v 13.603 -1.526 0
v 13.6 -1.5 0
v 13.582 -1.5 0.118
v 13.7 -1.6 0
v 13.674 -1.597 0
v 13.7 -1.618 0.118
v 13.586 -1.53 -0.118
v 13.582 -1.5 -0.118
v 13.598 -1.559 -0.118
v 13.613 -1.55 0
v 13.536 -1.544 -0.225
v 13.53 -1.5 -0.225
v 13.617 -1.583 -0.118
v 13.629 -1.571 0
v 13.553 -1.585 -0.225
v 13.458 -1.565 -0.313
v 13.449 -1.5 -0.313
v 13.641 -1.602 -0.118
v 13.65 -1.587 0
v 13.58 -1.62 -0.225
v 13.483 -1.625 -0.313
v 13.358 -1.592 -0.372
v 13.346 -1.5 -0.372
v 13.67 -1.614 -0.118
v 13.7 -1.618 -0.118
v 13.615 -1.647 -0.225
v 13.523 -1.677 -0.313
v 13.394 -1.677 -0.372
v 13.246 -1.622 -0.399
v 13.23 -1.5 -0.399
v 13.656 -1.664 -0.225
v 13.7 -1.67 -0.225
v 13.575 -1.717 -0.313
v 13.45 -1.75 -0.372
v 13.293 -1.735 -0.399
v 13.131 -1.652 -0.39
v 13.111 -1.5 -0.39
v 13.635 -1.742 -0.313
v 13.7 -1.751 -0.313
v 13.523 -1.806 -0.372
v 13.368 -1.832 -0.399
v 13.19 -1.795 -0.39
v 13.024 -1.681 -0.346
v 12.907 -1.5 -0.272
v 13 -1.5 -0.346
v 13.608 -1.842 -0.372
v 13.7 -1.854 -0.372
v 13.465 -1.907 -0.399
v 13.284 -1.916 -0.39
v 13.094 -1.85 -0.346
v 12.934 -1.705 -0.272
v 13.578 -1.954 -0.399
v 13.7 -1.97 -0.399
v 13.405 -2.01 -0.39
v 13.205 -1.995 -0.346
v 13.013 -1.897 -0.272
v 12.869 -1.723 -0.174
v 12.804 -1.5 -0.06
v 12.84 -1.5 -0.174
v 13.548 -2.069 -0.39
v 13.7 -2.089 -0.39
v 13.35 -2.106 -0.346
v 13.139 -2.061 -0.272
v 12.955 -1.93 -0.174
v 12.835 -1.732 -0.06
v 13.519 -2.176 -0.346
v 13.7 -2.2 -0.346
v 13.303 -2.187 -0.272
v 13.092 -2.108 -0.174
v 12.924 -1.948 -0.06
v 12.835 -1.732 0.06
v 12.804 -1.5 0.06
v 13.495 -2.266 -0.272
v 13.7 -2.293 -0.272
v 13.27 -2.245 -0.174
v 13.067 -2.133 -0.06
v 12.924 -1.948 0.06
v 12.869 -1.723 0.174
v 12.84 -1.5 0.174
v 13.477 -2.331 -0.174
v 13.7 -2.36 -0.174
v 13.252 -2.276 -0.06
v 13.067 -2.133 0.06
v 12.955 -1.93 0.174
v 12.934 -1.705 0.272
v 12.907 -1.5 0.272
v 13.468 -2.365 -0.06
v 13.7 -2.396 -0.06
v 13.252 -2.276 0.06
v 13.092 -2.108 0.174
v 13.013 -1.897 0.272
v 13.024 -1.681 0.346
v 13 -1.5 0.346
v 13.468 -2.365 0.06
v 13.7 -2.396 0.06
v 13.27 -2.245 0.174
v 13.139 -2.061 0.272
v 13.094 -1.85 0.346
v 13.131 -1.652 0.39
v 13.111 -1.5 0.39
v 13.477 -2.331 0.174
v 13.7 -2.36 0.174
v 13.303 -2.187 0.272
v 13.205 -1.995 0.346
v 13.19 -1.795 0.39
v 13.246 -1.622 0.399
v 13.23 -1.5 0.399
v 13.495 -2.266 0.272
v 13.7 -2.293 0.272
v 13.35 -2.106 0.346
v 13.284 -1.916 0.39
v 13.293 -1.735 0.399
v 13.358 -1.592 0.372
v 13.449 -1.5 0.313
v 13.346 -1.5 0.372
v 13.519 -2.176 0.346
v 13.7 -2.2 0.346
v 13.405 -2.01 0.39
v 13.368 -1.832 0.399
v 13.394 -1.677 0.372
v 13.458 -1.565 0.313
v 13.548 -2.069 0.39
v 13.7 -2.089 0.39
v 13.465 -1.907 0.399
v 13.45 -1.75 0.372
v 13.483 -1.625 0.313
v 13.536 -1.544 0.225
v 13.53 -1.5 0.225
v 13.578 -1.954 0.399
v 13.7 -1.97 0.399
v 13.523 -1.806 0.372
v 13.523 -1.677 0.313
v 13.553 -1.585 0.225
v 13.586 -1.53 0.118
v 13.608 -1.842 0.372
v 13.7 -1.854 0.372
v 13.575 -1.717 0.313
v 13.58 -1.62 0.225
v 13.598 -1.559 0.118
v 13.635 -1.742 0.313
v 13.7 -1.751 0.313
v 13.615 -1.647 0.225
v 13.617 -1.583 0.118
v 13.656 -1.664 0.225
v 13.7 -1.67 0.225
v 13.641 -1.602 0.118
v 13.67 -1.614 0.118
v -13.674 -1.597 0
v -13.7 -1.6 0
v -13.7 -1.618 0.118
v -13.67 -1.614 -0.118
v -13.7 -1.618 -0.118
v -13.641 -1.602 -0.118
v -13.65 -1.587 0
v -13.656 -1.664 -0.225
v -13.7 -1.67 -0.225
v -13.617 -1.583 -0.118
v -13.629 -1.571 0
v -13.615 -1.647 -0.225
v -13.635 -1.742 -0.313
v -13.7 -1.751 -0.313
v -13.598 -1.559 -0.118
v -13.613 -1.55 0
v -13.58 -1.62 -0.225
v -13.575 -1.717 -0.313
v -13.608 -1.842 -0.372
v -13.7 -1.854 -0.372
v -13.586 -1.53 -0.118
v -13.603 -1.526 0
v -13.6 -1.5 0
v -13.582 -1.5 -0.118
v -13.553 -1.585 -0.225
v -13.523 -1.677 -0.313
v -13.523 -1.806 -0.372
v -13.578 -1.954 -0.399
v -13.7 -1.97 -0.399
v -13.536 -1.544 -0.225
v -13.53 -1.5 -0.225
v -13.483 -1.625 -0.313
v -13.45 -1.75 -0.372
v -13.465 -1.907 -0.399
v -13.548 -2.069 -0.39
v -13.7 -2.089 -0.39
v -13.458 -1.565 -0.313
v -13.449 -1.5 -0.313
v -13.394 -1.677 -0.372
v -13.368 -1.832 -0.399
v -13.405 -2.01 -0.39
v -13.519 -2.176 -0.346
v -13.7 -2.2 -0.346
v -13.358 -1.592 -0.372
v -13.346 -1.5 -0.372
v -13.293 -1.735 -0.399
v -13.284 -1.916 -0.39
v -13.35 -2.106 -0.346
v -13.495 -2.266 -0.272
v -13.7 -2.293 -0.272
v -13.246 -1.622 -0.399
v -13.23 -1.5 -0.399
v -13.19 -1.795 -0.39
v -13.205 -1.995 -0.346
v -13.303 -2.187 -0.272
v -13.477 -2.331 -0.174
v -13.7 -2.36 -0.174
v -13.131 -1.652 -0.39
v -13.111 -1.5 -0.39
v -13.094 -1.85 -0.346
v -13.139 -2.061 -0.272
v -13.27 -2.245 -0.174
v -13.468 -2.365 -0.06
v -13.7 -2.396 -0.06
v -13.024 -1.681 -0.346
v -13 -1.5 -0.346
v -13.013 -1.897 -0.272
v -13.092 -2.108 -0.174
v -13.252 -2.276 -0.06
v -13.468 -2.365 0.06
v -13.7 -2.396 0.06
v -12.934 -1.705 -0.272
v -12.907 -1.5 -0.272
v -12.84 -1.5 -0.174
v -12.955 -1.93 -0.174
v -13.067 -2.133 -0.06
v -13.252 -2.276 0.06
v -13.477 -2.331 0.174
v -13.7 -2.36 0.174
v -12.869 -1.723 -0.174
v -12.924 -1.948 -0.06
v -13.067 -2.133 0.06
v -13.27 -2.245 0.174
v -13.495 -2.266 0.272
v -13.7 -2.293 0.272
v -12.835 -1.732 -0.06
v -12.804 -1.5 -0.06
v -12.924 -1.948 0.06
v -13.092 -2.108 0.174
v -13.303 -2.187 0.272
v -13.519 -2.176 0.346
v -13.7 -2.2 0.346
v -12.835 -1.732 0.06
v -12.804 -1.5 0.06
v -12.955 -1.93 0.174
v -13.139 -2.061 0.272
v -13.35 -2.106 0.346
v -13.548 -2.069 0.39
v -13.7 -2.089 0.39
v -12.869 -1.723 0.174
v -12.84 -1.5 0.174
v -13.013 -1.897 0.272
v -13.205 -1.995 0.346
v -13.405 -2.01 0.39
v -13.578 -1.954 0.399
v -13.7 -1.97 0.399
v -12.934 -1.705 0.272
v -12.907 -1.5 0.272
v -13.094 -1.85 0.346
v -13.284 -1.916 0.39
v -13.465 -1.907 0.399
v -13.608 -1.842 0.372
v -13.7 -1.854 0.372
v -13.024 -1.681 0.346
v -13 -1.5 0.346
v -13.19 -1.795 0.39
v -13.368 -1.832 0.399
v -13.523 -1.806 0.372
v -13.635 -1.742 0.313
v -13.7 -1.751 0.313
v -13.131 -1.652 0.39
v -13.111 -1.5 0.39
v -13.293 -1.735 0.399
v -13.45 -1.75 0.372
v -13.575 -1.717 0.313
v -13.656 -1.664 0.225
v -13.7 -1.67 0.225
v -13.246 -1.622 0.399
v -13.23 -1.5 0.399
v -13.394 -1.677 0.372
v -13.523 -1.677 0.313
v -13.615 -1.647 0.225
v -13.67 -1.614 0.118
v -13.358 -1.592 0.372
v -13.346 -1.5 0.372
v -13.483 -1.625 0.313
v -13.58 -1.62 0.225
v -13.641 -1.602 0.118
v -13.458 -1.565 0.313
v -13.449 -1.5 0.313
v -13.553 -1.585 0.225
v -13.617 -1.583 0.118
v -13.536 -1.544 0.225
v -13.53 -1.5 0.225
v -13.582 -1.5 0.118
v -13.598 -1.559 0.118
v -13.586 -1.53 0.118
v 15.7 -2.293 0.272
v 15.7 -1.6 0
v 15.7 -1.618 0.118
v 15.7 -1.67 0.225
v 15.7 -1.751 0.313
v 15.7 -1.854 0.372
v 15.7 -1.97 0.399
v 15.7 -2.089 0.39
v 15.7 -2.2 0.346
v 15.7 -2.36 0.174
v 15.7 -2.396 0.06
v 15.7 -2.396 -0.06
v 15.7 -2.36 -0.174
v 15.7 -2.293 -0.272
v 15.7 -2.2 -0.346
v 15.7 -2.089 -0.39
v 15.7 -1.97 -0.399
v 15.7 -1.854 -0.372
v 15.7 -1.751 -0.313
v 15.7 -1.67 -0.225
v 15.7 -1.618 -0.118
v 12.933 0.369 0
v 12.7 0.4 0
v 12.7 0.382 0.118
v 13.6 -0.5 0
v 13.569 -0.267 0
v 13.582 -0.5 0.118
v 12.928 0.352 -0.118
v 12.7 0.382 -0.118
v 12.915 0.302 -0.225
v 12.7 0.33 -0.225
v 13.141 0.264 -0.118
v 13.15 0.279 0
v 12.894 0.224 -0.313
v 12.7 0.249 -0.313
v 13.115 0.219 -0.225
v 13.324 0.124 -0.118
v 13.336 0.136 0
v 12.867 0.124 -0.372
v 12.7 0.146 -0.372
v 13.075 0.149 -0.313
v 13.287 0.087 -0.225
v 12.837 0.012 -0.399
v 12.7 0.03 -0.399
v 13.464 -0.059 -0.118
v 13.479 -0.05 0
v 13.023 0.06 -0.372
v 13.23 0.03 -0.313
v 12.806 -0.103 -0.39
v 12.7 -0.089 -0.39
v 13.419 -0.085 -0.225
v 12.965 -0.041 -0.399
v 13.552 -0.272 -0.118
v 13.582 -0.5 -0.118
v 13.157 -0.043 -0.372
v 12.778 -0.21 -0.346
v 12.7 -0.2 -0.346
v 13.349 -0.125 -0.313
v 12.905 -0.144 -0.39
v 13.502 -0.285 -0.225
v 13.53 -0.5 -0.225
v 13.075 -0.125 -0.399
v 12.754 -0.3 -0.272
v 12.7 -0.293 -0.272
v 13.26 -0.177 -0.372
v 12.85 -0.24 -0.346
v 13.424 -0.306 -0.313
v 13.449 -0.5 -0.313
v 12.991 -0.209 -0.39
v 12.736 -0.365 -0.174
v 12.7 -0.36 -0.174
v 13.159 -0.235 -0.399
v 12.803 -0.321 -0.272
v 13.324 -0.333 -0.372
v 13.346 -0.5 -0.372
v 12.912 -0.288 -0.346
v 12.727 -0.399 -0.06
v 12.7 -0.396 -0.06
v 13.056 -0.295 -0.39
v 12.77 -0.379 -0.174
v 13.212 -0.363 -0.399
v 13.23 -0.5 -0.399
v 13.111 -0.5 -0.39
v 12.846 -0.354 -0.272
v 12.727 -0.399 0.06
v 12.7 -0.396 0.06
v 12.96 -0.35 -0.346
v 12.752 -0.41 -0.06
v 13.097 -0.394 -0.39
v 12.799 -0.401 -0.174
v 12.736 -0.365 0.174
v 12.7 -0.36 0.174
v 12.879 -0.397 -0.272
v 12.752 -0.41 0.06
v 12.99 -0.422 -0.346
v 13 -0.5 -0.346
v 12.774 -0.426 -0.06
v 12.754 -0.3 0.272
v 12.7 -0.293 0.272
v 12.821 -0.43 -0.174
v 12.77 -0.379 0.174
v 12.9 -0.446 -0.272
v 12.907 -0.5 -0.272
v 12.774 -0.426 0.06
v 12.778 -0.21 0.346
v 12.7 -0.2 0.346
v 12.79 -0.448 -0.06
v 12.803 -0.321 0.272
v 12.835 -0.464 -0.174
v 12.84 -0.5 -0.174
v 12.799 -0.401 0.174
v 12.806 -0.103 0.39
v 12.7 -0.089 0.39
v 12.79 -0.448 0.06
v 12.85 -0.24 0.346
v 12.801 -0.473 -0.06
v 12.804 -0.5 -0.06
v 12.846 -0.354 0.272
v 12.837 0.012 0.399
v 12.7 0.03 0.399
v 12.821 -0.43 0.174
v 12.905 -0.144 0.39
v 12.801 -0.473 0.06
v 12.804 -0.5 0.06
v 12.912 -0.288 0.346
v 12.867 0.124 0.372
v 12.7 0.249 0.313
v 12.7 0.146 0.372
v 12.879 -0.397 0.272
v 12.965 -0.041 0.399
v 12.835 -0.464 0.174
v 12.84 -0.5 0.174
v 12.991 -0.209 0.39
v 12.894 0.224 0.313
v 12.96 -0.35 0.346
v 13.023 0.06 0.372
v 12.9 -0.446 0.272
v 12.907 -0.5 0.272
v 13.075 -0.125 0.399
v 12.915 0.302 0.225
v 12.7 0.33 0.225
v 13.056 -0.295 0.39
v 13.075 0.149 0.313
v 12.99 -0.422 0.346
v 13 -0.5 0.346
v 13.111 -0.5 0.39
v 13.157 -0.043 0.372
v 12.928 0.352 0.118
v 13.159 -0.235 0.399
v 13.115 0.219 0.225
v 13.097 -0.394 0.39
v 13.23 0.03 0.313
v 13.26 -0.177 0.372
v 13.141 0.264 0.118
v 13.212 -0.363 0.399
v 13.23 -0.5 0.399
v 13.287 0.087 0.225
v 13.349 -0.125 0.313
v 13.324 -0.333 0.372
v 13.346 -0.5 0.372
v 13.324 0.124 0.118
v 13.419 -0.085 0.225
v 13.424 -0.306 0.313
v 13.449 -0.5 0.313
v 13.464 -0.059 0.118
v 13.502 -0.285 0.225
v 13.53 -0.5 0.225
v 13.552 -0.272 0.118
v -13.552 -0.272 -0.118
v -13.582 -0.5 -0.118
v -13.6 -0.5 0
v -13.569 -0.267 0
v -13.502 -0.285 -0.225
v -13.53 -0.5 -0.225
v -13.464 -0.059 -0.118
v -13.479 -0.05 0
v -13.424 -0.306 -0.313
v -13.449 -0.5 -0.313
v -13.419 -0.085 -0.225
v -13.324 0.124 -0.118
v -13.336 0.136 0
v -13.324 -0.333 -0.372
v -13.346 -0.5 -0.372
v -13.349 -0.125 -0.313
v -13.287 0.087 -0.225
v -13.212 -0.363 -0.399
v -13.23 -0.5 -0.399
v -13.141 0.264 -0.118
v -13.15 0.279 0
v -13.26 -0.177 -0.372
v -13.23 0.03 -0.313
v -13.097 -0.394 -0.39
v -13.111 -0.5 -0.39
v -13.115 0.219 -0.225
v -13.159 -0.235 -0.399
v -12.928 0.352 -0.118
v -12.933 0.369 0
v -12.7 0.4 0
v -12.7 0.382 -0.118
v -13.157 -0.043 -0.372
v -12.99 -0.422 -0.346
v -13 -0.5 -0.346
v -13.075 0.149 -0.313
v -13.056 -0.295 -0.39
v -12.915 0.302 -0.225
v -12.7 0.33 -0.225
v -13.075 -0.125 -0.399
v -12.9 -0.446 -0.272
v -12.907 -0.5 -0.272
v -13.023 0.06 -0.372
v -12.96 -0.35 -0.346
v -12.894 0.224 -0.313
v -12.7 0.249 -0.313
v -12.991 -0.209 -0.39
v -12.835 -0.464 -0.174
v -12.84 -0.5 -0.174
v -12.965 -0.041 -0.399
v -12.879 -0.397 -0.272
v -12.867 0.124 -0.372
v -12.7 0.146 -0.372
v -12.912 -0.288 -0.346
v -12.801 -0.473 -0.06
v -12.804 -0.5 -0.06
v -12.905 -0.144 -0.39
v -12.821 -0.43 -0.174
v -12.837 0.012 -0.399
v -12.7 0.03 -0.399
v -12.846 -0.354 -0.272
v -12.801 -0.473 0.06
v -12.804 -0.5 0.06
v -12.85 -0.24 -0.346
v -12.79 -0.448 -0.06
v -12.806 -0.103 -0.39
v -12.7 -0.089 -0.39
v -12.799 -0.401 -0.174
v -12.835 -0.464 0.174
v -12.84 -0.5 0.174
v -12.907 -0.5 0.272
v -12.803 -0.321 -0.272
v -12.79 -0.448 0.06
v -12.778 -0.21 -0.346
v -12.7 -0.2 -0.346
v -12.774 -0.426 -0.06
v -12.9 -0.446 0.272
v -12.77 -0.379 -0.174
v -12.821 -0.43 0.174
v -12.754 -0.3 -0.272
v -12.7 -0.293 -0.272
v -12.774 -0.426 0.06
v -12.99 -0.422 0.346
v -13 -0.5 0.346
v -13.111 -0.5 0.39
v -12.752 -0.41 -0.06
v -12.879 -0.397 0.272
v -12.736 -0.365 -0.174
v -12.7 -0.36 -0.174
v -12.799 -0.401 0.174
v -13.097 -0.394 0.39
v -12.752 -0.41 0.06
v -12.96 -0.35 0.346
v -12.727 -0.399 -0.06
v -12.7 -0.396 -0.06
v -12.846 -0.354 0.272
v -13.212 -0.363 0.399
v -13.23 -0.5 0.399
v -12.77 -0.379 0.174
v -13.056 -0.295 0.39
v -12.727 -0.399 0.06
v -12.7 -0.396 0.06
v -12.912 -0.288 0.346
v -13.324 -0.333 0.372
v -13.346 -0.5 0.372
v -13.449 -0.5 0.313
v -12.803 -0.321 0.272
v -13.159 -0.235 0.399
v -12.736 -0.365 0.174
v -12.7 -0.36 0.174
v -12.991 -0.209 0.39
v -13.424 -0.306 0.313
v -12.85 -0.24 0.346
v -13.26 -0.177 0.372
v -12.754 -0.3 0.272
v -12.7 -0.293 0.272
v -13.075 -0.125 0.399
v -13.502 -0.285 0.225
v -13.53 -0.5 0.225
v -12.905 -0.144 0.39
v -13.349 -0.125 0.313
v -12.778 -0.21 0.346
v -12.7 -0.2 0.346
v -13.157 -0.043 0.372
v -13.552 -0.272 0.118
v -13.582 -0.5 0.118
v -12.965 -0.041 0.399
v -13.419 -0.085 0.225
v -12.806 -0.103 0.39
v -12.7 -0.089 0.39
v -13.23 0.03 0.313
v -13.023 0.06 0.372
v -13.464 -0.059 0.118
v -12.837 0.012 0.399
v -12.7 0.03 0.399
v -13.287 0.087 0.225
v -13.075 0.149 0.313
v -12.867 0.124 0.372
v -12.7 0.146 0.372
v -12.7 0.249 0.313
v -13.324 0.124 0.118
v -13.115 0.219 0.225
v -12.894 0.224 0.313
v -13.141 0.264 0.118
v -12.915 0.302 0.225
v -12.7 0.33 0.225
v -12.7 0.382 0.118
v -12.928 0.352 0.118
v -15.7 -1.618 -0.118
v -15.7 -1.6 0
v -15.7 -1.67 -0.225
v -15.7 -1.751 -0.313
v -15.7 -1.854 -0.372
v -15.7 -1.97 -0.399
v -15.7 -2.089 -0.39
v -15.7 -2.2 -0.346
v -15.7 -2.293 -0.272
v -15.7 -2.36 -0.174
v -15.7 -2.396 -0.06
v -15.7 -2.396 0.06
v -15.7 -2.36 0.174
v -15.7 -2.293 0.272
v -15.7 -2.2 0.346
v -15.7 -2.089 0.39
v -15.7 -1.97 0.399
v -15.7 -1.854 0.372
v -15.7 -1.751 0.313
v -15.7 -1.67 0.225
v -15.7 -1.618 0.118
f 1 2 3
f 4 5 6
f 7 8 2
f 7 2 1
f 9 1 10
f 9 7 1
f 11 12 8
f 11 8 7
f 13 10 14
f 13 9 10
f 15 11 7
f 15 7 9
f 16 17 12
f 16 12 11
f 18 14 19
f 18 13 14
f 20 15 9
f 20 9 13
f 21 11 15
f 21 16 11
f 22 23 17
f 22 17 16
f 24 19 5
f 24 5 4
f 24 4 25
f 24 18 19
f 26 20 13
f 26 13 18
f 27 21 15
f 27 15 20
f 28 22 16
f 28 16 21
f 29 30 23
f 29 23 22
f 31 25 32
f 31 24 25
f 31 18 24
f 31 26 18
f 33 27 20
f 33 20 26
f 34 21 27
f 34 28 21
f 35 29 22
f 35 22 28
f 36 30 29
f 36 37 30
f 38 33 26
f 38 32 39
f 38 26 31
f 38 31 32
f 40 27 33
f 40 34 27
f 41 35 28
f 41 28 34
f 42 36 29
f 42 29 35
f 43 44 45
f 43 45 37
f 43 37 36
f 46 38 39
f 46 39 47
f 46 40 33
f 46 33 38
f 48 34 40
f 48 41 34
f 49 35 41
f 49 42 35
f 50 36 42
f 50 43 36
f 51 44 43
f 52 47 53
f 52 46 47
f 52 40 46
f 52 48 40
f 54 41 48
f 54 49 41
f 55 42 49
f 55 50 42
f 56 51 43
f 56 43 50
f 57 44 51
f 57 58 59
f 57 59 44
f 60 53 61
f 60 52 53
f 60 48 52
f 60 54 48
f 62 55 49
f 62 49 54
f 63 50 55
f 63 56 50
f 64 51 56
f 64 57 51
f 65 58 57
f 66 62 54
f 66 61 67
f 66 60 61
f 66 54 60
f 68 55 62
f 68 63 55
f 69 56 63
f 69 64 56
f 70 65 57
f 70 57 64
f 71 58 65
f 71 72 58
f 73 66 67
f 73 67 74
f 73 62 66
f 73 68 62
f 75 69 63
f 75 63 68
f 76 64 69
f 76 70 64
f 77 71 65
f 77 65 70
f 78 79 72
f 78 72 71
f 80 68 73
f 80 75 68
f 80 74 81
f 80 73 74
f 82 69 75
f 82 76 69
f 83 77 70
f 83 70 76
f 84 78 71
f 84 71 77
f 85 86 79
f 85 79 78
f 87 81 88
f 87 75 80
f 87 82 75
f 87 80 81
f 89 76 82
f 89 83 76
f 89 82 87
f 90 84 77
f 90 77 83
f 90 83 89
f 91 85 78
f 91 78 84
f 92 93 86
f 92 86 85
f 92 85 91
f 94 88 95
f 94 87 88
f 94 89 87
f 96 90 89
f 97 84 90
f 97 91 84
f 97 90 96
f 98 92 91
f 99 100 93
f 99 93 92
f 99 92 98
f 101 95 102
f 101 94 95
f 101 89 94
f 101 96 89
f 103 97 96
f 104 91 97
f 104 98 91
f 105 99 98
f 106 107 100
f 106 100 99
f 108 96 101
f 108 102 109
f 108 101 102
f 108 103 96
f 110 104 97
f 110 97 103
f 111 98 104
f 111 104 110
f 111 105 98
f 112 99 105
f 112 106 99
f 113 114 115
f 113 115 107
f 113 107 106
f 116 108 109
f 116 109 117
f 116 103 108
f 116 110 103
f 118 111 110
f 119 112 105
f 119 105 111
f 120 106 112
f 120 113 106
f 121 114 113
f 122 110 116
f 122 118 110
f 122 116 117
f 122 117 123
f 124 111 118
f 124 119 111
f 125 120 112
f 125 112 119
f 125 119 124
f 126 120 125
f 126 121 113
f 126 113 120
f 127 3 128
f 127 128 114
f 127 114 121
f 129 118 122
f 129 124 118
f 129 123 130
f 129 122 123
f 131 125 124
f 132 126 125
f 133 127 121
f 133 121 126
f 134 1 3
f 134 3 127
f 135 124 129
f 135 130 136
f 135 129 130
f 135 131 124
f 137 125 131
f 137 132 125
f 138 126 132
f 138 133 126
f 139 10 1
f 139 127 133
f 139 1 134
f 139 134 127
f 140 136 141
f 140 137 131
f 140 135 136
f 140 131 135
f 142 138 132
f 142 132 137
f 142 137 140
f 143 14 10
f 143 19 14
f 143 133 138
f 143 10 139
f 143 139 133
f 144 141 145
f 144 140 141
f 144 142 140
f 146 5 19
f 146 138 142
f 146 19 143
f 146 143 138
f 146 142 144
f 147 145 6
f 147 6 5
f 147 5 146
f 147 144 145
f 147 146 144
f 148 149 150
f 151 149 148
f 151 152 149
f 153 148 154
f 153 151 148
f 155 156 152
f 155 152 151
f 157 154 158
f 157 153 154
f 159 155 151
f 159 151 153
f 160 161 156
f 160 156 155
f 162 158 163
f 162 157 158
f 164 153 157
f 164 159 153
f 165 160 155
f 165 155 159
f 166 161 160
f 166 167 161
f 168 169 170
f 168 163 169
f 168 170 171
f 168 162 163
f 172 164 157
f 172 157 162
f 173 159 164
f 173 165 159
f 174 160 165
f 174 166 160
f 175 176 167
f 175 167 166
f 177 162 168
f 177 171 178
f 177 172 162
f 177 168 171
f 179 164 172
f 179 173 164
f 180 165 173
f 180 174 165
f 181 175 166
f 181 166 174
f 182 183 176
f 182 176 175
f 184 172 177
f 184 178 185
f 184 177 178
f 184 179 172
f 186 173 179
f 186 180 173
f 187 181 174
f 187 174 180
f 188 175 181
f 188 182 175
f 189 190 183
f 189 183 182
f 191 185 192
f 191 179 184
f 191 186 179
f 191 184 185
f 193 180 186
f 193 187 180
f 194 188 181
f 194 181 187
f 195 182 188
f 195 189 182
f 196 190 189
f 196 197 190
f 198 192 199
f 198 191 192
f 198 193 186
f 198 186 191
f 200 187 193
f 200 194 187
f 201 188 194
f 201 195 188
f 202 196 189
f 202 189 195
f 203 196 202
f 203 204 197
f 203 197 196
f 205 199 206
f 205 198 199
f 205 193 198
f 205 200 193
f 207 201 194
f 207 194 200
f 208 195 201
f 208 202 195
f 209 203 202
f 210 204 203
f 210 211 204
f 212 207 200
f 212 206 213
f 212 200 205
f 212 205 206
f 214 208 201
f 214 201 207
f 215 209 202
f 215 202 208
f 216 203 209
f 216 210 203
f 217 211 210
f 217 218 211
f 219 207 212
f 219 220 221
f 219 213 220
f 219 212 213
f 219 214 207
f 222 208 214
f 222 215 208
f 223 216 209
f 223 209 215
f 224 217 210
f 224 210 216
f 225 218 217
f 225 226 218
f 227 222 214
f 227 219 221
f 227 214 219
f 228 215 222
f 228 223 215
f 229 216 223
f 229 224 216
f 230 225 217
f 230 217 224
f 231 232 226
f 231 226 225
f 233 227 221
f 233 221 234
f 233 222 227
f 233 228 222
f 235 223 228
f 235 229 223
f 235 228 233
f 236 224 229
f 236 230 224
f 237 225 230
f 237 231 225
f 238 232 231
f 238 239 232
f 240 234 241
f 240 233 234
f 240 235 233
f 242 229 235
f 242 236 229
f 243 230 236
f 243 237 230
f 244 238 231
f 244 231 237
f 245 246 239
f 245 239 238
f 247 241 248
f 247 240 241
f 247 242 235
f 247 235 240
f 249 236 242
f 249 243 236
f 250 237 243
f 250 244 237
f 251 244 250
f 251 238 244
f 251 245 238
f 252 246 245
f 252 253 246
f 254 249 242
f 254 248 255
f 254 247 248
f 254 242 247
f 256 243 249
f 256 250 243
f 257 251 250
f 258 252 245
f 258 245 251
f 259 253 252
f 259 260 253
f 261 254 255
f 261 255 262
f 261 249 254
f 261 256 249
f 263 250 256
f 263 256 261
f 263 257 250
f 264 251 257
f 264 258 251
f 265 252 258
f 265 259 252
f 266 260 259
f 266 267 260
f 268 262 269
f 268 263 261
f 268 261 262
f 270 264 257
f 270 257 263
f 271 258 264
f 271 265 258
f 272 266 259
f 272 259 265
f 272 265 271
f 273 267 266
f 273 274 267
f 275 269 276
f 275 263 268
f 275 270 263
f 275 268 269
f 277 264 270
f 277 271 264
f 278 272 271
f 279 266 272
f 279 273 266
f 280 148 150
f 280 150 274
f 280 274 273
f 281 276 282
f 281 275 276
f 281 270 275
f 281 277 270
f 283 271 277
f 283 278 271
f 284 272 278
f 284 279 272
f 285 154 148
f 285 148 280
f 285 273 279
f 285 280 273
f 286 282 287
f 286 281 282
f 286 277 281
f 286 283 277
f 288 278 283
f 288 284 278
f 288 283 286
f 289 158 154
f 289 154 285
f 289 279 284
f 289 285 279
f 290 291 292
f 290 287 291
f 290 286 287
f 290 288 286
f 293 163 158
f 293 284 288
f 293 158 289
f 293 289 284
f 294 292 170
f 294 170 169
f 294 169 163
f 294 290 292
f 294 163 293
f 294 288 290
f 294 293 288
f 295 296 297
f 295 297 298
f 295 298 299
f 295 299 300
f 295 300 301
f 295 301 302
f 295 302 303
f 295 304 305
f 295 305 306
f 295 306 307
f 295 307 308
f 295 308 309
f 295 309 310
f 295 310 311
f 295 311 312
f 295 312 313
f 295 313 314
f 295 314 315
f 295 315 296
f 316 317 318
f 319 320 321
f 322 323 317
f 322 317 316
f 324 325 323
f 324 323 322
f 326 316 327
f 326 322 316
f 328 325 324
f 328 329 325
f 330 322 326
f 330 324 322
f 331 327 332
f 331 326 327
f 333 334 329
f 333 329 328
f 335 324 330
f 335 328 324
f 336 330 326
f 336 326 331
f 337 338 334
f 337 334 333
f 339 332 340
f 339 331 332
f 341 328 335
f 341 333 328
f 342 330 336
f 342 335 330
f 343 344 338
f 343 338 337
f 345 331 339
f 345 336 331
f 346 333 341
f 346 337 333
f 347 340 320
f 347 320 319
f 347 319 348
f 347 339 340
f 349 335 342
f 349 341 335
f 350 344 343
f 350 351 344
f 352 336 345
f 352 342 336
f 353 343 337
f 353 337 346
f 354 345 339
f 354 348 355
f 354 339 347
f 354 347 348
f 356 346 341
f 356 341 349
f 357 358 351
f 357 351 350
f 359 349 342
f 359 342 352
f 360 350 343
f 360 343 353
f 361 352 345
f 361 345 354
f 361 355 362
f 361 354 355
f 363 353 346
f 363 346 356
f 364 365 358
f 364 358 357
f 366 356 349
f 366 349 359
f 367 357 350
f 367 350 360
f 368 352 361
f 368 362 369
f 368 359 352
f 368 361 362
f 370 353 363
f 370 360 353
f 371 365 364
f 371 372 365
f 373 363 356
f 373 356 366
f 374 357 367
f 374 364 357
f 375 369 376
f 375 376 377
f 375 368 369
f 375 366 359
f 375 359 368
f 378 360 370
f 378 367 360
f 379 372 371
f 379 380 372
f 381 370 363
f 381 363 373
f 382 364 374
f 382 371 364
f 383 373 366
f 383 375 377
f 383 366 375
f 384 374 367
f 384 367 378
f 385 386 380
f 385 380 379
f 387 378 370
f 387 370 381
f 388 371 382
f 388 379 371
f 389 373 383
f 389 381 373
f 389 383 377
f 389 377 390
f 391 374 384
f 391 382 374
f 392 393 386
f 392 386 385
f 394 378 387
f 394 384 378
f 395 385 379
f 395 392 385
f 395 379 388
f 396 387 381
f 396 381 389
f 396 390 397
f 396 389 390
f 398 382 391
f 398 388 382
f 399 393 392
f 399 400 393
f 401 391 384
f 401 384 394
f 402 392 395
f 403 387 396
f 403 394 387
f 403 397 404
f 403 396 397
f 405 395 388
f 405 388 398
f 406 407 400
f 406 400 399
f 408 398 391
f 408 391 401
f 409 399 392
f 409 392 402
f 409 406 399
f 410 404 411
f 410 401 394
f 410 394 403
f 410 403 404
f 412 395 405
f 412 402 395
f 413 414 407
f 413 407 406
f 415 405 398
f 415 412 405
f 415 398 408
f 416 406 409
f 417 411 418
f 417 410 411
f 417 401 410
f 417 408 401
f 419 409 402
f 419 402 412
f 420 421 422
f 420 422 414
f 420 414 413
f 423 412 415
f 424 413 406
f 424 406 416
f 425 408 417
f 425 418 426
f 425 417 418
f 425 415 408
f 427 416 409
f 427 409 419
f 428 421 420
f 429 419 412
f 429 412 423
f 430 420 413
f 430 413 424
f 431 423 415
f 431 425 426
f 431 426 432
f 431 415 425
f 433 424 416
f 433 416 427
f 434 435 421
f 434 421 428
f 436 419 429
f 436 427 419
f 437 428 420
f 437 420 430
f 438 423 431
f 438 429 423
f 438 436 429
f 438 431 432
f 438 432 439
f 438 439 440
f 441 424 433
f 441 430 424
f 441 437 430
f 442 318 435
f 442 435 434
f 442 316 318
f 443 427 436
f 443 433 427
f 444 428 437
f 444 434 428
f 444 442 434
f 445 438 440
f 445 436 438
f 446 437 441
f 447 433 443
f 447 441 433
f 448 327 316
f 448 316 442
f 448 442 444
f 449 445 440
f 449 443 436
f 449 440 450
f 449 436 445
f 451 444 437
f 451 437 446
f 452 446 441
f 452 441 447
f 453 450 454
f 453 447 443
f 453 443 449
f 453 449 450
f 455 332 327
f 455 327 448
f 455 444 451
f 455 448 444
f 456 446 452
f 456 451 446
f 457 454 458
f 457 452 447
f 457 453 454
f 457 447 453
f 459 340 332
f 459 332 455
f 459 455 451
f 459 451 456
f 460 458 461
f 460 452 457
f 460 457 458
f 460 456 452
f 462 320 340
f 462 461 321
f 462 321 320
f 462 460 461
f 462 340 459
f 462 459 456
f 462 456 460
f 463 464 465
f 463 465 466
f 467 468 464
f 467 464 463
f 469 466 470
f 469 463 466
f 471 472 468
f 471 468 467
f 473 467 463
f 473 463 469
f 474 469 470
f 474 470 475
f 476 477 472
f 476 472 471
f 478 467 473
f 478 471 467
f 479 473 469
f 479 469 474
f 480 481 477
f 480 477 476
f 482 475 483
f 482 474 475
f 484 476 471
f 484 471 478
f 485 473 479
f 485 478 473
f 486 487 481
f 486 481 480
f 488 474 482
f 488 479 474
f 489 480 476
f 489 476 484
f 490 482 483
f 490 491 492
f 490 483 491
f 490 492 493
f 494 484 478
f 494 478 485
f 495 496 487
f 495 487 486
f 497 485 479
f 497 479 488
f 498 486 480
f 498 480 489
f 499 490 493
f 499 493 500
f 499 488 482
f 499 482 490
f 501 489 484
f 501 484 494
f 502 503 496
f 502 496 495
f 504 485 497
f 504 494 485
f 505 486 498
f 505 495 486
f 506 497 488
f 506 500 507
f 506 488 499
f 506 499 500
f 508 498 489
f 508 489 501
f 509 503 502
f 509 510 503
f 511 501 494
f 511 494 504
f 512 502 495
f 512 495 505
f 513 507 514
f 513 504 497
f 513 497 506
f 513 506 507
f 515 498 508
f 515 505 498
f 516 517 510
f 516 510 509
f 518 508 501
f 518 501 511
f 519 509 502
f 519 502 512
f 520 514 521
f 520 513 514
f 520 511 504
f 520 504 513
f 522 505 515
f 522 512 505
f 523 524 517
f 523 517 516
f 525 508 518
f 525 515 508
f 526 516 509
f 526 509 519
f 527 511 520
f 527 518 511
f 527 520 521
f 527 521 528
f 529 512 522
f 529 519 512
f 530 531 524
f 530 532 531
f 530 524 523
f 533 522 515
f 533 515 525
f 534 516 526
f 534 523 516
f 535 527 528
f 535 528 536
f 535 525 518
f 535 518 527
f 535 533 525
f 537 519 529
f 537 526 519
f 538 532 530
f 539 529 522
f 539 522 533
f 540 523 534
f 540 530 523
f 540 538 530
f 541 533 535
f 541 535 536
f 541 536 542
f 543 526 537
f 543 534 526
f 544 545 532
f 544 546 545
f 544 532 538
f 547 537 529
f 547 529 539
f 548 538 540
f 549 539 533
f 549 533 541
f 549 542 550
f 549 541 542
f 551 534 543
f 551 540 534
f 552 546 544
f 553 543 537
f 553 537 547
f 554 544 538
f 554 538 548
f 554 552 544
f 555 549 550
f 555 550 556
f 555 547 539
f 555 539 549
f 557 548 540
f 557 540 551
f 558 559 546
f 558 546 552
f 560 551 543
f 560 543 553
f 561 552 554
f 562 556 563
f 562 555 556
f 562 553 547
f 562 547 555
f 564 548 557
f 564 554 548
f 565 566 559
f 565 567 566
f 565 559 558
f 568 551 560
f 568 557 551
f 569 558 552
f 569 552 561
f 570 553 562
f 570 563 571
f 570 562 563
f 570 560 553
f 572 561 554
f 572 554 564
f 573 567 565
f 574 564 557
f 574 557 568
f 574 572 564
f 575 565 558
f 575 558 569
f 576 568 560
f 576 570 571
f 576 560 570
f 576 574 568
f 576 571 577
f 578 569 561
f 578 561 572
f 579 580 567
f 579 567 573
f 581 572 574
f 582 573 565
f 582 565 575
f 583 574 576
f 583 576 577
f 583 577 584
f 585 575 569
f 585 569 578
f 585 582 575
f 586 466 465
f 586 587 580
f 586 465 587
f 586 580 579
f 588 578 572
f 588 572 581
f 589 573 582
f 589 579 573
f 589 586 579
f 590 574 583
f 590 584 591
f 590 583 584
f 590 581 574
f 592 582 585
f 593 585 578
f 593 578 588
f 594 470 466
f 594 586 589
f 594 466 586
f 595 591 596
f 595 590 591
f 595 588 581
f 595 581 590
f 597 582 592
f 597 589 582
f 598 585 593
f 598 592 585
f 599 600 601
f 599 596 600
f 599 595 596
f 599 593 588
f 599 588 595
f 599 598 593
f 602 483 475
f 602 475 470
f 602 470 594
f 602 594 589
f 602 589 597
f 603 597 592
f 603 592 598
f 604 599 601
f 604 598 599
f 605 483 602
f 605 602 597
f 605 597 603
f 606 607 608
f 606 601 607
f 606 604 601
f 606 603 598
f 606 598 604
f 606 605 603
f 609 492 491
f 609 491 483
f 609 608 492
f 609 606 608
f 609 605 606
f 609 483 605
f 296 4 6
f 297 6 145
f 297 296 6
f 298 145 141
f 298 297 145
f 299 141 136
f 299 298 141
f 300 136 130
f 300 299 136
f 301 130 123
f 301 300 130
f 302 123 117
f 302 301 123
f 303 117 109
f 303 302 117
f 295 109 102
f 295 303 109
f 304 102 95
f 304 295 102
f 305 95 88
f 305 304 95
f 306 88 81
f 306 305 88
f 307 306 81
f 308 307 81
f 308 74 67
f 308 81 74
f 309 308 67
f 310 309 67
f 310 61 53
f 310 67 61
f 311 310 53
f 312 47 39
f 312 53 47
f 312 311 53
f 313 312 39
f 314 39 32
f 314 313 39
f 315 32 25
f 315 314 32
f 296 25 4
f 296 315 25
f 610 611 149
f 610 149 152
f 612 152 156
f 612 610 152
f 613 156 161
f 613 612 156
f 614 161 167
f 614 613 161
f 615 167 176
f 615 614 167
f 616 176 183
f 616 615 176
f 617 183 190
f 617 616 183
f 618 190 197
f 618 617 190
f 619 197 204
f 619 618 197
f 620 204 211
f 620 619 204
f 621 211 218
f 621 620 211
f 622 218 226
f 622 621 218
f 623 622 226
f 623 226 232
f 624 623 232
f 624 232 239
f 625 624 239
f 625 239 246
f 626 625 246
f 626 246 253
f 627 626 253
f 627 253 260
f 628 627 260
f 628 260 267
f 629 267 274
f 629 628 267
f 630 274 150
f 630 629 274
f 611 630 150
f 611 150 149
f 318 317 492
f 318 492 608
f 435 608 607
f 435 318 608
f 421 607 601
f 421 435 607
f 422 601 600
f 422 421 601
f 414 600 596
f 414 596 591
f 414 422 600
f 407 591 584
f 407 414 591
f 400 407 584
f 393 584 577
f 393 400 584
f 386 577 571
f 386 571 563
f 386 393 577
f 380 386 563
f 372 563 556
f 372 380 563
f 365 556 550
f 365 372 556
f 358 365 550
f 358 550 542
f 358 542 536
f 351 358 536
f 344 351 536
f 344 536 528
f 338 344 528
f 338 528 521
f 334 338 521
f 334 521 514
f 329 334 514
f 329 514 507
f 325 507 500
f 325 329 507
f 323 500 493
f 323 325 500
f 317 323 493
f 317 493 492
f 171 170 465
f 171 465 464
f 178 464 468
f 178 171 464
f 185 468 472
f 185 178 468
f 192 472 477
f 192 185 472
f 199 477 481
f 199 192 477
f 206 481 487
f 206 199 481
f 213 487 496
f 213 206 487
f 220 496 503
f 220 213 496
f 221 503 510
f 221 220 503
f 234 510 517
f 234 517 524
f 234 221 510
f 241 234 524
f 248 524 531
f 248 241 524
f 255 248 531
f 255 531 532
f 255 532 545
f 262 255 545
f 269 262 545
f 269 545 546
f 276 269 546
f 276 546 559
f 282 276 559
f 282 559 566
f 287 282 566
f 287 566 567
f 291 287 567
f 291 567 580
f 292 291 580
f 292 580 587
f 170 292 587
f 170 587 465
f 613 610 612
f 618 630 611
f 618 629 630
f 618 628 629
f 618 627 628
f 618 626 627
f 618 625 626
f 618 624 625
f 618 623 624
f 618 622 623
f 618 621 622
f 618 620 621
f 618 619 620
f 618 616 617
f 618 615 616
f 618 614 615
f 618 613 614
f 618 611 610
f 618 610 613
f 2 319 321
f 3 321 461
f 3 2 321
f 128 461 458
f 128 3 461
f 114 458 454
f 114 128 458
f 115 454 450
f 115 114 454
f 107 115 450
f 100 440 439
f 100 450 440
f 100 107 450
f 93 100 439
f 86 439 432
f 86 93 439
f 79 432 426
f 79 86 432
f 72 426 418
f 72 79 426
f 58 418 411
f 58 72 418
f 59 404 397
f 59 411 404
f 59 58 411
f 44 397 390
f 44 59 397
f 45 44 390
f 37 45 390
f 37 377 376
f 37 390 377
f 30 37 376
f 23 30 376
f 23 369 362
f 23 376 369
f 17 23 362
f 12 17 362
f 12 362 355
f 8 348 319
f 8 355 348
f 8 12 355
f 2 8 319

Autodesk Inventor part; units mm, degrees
ref_plane "XZ Plane" through (0, 0, 0) normal (0, 1, 0) x (-1, 0, 0)
ref_plane "XY Plane" through (0, 0, 0) normal (0, 0, 1) x (1, 0, 0)
sketch "Sketch1" plane through (0, 0, 0) normal (0, 0, 1) x (1, 0, 0)
  line L0 (0, 0) -> (12.7, 0)
  arc A0 (13.2, -0.5) -> (12.7, 0) centre (12.7, -0.5) ccw
  line L1 (13.2, -0.5) -> (13.2, -1.5)
  arc A1 (13.2, -1.5) -> (13.7, -2) centre (13.7, -1.5) ccw
  line L2 (13.7, -2) -> (15.7, -2)
  dimension "d0" = 0.5
  dimension "d1" = 2
  dimension "d2" = 90
  dimension "d3" = 12.7
  dimension "d5" = 2
ref_plane "Work Plane2" through (15.7, -2, 0) normal (1, 0, 0) x (0, 1, 0)
sketch "Sketch3" plane through (15.7, -2, 0) normal (1, 0, 0) x (0, 1, 0)
  circle A0 centre (0, 0) radius 0.4
  point P0 (2, 0)
  dimension "d6" = 0.8
sweep "Sweep1" add profiles "Sketch3" path "Sketch1"
mirror "Mirror1" about plane through (0, 0, 0) normal (-1, 0, 0) of "Sweep1"
properties part number "rotobot pushrod"
